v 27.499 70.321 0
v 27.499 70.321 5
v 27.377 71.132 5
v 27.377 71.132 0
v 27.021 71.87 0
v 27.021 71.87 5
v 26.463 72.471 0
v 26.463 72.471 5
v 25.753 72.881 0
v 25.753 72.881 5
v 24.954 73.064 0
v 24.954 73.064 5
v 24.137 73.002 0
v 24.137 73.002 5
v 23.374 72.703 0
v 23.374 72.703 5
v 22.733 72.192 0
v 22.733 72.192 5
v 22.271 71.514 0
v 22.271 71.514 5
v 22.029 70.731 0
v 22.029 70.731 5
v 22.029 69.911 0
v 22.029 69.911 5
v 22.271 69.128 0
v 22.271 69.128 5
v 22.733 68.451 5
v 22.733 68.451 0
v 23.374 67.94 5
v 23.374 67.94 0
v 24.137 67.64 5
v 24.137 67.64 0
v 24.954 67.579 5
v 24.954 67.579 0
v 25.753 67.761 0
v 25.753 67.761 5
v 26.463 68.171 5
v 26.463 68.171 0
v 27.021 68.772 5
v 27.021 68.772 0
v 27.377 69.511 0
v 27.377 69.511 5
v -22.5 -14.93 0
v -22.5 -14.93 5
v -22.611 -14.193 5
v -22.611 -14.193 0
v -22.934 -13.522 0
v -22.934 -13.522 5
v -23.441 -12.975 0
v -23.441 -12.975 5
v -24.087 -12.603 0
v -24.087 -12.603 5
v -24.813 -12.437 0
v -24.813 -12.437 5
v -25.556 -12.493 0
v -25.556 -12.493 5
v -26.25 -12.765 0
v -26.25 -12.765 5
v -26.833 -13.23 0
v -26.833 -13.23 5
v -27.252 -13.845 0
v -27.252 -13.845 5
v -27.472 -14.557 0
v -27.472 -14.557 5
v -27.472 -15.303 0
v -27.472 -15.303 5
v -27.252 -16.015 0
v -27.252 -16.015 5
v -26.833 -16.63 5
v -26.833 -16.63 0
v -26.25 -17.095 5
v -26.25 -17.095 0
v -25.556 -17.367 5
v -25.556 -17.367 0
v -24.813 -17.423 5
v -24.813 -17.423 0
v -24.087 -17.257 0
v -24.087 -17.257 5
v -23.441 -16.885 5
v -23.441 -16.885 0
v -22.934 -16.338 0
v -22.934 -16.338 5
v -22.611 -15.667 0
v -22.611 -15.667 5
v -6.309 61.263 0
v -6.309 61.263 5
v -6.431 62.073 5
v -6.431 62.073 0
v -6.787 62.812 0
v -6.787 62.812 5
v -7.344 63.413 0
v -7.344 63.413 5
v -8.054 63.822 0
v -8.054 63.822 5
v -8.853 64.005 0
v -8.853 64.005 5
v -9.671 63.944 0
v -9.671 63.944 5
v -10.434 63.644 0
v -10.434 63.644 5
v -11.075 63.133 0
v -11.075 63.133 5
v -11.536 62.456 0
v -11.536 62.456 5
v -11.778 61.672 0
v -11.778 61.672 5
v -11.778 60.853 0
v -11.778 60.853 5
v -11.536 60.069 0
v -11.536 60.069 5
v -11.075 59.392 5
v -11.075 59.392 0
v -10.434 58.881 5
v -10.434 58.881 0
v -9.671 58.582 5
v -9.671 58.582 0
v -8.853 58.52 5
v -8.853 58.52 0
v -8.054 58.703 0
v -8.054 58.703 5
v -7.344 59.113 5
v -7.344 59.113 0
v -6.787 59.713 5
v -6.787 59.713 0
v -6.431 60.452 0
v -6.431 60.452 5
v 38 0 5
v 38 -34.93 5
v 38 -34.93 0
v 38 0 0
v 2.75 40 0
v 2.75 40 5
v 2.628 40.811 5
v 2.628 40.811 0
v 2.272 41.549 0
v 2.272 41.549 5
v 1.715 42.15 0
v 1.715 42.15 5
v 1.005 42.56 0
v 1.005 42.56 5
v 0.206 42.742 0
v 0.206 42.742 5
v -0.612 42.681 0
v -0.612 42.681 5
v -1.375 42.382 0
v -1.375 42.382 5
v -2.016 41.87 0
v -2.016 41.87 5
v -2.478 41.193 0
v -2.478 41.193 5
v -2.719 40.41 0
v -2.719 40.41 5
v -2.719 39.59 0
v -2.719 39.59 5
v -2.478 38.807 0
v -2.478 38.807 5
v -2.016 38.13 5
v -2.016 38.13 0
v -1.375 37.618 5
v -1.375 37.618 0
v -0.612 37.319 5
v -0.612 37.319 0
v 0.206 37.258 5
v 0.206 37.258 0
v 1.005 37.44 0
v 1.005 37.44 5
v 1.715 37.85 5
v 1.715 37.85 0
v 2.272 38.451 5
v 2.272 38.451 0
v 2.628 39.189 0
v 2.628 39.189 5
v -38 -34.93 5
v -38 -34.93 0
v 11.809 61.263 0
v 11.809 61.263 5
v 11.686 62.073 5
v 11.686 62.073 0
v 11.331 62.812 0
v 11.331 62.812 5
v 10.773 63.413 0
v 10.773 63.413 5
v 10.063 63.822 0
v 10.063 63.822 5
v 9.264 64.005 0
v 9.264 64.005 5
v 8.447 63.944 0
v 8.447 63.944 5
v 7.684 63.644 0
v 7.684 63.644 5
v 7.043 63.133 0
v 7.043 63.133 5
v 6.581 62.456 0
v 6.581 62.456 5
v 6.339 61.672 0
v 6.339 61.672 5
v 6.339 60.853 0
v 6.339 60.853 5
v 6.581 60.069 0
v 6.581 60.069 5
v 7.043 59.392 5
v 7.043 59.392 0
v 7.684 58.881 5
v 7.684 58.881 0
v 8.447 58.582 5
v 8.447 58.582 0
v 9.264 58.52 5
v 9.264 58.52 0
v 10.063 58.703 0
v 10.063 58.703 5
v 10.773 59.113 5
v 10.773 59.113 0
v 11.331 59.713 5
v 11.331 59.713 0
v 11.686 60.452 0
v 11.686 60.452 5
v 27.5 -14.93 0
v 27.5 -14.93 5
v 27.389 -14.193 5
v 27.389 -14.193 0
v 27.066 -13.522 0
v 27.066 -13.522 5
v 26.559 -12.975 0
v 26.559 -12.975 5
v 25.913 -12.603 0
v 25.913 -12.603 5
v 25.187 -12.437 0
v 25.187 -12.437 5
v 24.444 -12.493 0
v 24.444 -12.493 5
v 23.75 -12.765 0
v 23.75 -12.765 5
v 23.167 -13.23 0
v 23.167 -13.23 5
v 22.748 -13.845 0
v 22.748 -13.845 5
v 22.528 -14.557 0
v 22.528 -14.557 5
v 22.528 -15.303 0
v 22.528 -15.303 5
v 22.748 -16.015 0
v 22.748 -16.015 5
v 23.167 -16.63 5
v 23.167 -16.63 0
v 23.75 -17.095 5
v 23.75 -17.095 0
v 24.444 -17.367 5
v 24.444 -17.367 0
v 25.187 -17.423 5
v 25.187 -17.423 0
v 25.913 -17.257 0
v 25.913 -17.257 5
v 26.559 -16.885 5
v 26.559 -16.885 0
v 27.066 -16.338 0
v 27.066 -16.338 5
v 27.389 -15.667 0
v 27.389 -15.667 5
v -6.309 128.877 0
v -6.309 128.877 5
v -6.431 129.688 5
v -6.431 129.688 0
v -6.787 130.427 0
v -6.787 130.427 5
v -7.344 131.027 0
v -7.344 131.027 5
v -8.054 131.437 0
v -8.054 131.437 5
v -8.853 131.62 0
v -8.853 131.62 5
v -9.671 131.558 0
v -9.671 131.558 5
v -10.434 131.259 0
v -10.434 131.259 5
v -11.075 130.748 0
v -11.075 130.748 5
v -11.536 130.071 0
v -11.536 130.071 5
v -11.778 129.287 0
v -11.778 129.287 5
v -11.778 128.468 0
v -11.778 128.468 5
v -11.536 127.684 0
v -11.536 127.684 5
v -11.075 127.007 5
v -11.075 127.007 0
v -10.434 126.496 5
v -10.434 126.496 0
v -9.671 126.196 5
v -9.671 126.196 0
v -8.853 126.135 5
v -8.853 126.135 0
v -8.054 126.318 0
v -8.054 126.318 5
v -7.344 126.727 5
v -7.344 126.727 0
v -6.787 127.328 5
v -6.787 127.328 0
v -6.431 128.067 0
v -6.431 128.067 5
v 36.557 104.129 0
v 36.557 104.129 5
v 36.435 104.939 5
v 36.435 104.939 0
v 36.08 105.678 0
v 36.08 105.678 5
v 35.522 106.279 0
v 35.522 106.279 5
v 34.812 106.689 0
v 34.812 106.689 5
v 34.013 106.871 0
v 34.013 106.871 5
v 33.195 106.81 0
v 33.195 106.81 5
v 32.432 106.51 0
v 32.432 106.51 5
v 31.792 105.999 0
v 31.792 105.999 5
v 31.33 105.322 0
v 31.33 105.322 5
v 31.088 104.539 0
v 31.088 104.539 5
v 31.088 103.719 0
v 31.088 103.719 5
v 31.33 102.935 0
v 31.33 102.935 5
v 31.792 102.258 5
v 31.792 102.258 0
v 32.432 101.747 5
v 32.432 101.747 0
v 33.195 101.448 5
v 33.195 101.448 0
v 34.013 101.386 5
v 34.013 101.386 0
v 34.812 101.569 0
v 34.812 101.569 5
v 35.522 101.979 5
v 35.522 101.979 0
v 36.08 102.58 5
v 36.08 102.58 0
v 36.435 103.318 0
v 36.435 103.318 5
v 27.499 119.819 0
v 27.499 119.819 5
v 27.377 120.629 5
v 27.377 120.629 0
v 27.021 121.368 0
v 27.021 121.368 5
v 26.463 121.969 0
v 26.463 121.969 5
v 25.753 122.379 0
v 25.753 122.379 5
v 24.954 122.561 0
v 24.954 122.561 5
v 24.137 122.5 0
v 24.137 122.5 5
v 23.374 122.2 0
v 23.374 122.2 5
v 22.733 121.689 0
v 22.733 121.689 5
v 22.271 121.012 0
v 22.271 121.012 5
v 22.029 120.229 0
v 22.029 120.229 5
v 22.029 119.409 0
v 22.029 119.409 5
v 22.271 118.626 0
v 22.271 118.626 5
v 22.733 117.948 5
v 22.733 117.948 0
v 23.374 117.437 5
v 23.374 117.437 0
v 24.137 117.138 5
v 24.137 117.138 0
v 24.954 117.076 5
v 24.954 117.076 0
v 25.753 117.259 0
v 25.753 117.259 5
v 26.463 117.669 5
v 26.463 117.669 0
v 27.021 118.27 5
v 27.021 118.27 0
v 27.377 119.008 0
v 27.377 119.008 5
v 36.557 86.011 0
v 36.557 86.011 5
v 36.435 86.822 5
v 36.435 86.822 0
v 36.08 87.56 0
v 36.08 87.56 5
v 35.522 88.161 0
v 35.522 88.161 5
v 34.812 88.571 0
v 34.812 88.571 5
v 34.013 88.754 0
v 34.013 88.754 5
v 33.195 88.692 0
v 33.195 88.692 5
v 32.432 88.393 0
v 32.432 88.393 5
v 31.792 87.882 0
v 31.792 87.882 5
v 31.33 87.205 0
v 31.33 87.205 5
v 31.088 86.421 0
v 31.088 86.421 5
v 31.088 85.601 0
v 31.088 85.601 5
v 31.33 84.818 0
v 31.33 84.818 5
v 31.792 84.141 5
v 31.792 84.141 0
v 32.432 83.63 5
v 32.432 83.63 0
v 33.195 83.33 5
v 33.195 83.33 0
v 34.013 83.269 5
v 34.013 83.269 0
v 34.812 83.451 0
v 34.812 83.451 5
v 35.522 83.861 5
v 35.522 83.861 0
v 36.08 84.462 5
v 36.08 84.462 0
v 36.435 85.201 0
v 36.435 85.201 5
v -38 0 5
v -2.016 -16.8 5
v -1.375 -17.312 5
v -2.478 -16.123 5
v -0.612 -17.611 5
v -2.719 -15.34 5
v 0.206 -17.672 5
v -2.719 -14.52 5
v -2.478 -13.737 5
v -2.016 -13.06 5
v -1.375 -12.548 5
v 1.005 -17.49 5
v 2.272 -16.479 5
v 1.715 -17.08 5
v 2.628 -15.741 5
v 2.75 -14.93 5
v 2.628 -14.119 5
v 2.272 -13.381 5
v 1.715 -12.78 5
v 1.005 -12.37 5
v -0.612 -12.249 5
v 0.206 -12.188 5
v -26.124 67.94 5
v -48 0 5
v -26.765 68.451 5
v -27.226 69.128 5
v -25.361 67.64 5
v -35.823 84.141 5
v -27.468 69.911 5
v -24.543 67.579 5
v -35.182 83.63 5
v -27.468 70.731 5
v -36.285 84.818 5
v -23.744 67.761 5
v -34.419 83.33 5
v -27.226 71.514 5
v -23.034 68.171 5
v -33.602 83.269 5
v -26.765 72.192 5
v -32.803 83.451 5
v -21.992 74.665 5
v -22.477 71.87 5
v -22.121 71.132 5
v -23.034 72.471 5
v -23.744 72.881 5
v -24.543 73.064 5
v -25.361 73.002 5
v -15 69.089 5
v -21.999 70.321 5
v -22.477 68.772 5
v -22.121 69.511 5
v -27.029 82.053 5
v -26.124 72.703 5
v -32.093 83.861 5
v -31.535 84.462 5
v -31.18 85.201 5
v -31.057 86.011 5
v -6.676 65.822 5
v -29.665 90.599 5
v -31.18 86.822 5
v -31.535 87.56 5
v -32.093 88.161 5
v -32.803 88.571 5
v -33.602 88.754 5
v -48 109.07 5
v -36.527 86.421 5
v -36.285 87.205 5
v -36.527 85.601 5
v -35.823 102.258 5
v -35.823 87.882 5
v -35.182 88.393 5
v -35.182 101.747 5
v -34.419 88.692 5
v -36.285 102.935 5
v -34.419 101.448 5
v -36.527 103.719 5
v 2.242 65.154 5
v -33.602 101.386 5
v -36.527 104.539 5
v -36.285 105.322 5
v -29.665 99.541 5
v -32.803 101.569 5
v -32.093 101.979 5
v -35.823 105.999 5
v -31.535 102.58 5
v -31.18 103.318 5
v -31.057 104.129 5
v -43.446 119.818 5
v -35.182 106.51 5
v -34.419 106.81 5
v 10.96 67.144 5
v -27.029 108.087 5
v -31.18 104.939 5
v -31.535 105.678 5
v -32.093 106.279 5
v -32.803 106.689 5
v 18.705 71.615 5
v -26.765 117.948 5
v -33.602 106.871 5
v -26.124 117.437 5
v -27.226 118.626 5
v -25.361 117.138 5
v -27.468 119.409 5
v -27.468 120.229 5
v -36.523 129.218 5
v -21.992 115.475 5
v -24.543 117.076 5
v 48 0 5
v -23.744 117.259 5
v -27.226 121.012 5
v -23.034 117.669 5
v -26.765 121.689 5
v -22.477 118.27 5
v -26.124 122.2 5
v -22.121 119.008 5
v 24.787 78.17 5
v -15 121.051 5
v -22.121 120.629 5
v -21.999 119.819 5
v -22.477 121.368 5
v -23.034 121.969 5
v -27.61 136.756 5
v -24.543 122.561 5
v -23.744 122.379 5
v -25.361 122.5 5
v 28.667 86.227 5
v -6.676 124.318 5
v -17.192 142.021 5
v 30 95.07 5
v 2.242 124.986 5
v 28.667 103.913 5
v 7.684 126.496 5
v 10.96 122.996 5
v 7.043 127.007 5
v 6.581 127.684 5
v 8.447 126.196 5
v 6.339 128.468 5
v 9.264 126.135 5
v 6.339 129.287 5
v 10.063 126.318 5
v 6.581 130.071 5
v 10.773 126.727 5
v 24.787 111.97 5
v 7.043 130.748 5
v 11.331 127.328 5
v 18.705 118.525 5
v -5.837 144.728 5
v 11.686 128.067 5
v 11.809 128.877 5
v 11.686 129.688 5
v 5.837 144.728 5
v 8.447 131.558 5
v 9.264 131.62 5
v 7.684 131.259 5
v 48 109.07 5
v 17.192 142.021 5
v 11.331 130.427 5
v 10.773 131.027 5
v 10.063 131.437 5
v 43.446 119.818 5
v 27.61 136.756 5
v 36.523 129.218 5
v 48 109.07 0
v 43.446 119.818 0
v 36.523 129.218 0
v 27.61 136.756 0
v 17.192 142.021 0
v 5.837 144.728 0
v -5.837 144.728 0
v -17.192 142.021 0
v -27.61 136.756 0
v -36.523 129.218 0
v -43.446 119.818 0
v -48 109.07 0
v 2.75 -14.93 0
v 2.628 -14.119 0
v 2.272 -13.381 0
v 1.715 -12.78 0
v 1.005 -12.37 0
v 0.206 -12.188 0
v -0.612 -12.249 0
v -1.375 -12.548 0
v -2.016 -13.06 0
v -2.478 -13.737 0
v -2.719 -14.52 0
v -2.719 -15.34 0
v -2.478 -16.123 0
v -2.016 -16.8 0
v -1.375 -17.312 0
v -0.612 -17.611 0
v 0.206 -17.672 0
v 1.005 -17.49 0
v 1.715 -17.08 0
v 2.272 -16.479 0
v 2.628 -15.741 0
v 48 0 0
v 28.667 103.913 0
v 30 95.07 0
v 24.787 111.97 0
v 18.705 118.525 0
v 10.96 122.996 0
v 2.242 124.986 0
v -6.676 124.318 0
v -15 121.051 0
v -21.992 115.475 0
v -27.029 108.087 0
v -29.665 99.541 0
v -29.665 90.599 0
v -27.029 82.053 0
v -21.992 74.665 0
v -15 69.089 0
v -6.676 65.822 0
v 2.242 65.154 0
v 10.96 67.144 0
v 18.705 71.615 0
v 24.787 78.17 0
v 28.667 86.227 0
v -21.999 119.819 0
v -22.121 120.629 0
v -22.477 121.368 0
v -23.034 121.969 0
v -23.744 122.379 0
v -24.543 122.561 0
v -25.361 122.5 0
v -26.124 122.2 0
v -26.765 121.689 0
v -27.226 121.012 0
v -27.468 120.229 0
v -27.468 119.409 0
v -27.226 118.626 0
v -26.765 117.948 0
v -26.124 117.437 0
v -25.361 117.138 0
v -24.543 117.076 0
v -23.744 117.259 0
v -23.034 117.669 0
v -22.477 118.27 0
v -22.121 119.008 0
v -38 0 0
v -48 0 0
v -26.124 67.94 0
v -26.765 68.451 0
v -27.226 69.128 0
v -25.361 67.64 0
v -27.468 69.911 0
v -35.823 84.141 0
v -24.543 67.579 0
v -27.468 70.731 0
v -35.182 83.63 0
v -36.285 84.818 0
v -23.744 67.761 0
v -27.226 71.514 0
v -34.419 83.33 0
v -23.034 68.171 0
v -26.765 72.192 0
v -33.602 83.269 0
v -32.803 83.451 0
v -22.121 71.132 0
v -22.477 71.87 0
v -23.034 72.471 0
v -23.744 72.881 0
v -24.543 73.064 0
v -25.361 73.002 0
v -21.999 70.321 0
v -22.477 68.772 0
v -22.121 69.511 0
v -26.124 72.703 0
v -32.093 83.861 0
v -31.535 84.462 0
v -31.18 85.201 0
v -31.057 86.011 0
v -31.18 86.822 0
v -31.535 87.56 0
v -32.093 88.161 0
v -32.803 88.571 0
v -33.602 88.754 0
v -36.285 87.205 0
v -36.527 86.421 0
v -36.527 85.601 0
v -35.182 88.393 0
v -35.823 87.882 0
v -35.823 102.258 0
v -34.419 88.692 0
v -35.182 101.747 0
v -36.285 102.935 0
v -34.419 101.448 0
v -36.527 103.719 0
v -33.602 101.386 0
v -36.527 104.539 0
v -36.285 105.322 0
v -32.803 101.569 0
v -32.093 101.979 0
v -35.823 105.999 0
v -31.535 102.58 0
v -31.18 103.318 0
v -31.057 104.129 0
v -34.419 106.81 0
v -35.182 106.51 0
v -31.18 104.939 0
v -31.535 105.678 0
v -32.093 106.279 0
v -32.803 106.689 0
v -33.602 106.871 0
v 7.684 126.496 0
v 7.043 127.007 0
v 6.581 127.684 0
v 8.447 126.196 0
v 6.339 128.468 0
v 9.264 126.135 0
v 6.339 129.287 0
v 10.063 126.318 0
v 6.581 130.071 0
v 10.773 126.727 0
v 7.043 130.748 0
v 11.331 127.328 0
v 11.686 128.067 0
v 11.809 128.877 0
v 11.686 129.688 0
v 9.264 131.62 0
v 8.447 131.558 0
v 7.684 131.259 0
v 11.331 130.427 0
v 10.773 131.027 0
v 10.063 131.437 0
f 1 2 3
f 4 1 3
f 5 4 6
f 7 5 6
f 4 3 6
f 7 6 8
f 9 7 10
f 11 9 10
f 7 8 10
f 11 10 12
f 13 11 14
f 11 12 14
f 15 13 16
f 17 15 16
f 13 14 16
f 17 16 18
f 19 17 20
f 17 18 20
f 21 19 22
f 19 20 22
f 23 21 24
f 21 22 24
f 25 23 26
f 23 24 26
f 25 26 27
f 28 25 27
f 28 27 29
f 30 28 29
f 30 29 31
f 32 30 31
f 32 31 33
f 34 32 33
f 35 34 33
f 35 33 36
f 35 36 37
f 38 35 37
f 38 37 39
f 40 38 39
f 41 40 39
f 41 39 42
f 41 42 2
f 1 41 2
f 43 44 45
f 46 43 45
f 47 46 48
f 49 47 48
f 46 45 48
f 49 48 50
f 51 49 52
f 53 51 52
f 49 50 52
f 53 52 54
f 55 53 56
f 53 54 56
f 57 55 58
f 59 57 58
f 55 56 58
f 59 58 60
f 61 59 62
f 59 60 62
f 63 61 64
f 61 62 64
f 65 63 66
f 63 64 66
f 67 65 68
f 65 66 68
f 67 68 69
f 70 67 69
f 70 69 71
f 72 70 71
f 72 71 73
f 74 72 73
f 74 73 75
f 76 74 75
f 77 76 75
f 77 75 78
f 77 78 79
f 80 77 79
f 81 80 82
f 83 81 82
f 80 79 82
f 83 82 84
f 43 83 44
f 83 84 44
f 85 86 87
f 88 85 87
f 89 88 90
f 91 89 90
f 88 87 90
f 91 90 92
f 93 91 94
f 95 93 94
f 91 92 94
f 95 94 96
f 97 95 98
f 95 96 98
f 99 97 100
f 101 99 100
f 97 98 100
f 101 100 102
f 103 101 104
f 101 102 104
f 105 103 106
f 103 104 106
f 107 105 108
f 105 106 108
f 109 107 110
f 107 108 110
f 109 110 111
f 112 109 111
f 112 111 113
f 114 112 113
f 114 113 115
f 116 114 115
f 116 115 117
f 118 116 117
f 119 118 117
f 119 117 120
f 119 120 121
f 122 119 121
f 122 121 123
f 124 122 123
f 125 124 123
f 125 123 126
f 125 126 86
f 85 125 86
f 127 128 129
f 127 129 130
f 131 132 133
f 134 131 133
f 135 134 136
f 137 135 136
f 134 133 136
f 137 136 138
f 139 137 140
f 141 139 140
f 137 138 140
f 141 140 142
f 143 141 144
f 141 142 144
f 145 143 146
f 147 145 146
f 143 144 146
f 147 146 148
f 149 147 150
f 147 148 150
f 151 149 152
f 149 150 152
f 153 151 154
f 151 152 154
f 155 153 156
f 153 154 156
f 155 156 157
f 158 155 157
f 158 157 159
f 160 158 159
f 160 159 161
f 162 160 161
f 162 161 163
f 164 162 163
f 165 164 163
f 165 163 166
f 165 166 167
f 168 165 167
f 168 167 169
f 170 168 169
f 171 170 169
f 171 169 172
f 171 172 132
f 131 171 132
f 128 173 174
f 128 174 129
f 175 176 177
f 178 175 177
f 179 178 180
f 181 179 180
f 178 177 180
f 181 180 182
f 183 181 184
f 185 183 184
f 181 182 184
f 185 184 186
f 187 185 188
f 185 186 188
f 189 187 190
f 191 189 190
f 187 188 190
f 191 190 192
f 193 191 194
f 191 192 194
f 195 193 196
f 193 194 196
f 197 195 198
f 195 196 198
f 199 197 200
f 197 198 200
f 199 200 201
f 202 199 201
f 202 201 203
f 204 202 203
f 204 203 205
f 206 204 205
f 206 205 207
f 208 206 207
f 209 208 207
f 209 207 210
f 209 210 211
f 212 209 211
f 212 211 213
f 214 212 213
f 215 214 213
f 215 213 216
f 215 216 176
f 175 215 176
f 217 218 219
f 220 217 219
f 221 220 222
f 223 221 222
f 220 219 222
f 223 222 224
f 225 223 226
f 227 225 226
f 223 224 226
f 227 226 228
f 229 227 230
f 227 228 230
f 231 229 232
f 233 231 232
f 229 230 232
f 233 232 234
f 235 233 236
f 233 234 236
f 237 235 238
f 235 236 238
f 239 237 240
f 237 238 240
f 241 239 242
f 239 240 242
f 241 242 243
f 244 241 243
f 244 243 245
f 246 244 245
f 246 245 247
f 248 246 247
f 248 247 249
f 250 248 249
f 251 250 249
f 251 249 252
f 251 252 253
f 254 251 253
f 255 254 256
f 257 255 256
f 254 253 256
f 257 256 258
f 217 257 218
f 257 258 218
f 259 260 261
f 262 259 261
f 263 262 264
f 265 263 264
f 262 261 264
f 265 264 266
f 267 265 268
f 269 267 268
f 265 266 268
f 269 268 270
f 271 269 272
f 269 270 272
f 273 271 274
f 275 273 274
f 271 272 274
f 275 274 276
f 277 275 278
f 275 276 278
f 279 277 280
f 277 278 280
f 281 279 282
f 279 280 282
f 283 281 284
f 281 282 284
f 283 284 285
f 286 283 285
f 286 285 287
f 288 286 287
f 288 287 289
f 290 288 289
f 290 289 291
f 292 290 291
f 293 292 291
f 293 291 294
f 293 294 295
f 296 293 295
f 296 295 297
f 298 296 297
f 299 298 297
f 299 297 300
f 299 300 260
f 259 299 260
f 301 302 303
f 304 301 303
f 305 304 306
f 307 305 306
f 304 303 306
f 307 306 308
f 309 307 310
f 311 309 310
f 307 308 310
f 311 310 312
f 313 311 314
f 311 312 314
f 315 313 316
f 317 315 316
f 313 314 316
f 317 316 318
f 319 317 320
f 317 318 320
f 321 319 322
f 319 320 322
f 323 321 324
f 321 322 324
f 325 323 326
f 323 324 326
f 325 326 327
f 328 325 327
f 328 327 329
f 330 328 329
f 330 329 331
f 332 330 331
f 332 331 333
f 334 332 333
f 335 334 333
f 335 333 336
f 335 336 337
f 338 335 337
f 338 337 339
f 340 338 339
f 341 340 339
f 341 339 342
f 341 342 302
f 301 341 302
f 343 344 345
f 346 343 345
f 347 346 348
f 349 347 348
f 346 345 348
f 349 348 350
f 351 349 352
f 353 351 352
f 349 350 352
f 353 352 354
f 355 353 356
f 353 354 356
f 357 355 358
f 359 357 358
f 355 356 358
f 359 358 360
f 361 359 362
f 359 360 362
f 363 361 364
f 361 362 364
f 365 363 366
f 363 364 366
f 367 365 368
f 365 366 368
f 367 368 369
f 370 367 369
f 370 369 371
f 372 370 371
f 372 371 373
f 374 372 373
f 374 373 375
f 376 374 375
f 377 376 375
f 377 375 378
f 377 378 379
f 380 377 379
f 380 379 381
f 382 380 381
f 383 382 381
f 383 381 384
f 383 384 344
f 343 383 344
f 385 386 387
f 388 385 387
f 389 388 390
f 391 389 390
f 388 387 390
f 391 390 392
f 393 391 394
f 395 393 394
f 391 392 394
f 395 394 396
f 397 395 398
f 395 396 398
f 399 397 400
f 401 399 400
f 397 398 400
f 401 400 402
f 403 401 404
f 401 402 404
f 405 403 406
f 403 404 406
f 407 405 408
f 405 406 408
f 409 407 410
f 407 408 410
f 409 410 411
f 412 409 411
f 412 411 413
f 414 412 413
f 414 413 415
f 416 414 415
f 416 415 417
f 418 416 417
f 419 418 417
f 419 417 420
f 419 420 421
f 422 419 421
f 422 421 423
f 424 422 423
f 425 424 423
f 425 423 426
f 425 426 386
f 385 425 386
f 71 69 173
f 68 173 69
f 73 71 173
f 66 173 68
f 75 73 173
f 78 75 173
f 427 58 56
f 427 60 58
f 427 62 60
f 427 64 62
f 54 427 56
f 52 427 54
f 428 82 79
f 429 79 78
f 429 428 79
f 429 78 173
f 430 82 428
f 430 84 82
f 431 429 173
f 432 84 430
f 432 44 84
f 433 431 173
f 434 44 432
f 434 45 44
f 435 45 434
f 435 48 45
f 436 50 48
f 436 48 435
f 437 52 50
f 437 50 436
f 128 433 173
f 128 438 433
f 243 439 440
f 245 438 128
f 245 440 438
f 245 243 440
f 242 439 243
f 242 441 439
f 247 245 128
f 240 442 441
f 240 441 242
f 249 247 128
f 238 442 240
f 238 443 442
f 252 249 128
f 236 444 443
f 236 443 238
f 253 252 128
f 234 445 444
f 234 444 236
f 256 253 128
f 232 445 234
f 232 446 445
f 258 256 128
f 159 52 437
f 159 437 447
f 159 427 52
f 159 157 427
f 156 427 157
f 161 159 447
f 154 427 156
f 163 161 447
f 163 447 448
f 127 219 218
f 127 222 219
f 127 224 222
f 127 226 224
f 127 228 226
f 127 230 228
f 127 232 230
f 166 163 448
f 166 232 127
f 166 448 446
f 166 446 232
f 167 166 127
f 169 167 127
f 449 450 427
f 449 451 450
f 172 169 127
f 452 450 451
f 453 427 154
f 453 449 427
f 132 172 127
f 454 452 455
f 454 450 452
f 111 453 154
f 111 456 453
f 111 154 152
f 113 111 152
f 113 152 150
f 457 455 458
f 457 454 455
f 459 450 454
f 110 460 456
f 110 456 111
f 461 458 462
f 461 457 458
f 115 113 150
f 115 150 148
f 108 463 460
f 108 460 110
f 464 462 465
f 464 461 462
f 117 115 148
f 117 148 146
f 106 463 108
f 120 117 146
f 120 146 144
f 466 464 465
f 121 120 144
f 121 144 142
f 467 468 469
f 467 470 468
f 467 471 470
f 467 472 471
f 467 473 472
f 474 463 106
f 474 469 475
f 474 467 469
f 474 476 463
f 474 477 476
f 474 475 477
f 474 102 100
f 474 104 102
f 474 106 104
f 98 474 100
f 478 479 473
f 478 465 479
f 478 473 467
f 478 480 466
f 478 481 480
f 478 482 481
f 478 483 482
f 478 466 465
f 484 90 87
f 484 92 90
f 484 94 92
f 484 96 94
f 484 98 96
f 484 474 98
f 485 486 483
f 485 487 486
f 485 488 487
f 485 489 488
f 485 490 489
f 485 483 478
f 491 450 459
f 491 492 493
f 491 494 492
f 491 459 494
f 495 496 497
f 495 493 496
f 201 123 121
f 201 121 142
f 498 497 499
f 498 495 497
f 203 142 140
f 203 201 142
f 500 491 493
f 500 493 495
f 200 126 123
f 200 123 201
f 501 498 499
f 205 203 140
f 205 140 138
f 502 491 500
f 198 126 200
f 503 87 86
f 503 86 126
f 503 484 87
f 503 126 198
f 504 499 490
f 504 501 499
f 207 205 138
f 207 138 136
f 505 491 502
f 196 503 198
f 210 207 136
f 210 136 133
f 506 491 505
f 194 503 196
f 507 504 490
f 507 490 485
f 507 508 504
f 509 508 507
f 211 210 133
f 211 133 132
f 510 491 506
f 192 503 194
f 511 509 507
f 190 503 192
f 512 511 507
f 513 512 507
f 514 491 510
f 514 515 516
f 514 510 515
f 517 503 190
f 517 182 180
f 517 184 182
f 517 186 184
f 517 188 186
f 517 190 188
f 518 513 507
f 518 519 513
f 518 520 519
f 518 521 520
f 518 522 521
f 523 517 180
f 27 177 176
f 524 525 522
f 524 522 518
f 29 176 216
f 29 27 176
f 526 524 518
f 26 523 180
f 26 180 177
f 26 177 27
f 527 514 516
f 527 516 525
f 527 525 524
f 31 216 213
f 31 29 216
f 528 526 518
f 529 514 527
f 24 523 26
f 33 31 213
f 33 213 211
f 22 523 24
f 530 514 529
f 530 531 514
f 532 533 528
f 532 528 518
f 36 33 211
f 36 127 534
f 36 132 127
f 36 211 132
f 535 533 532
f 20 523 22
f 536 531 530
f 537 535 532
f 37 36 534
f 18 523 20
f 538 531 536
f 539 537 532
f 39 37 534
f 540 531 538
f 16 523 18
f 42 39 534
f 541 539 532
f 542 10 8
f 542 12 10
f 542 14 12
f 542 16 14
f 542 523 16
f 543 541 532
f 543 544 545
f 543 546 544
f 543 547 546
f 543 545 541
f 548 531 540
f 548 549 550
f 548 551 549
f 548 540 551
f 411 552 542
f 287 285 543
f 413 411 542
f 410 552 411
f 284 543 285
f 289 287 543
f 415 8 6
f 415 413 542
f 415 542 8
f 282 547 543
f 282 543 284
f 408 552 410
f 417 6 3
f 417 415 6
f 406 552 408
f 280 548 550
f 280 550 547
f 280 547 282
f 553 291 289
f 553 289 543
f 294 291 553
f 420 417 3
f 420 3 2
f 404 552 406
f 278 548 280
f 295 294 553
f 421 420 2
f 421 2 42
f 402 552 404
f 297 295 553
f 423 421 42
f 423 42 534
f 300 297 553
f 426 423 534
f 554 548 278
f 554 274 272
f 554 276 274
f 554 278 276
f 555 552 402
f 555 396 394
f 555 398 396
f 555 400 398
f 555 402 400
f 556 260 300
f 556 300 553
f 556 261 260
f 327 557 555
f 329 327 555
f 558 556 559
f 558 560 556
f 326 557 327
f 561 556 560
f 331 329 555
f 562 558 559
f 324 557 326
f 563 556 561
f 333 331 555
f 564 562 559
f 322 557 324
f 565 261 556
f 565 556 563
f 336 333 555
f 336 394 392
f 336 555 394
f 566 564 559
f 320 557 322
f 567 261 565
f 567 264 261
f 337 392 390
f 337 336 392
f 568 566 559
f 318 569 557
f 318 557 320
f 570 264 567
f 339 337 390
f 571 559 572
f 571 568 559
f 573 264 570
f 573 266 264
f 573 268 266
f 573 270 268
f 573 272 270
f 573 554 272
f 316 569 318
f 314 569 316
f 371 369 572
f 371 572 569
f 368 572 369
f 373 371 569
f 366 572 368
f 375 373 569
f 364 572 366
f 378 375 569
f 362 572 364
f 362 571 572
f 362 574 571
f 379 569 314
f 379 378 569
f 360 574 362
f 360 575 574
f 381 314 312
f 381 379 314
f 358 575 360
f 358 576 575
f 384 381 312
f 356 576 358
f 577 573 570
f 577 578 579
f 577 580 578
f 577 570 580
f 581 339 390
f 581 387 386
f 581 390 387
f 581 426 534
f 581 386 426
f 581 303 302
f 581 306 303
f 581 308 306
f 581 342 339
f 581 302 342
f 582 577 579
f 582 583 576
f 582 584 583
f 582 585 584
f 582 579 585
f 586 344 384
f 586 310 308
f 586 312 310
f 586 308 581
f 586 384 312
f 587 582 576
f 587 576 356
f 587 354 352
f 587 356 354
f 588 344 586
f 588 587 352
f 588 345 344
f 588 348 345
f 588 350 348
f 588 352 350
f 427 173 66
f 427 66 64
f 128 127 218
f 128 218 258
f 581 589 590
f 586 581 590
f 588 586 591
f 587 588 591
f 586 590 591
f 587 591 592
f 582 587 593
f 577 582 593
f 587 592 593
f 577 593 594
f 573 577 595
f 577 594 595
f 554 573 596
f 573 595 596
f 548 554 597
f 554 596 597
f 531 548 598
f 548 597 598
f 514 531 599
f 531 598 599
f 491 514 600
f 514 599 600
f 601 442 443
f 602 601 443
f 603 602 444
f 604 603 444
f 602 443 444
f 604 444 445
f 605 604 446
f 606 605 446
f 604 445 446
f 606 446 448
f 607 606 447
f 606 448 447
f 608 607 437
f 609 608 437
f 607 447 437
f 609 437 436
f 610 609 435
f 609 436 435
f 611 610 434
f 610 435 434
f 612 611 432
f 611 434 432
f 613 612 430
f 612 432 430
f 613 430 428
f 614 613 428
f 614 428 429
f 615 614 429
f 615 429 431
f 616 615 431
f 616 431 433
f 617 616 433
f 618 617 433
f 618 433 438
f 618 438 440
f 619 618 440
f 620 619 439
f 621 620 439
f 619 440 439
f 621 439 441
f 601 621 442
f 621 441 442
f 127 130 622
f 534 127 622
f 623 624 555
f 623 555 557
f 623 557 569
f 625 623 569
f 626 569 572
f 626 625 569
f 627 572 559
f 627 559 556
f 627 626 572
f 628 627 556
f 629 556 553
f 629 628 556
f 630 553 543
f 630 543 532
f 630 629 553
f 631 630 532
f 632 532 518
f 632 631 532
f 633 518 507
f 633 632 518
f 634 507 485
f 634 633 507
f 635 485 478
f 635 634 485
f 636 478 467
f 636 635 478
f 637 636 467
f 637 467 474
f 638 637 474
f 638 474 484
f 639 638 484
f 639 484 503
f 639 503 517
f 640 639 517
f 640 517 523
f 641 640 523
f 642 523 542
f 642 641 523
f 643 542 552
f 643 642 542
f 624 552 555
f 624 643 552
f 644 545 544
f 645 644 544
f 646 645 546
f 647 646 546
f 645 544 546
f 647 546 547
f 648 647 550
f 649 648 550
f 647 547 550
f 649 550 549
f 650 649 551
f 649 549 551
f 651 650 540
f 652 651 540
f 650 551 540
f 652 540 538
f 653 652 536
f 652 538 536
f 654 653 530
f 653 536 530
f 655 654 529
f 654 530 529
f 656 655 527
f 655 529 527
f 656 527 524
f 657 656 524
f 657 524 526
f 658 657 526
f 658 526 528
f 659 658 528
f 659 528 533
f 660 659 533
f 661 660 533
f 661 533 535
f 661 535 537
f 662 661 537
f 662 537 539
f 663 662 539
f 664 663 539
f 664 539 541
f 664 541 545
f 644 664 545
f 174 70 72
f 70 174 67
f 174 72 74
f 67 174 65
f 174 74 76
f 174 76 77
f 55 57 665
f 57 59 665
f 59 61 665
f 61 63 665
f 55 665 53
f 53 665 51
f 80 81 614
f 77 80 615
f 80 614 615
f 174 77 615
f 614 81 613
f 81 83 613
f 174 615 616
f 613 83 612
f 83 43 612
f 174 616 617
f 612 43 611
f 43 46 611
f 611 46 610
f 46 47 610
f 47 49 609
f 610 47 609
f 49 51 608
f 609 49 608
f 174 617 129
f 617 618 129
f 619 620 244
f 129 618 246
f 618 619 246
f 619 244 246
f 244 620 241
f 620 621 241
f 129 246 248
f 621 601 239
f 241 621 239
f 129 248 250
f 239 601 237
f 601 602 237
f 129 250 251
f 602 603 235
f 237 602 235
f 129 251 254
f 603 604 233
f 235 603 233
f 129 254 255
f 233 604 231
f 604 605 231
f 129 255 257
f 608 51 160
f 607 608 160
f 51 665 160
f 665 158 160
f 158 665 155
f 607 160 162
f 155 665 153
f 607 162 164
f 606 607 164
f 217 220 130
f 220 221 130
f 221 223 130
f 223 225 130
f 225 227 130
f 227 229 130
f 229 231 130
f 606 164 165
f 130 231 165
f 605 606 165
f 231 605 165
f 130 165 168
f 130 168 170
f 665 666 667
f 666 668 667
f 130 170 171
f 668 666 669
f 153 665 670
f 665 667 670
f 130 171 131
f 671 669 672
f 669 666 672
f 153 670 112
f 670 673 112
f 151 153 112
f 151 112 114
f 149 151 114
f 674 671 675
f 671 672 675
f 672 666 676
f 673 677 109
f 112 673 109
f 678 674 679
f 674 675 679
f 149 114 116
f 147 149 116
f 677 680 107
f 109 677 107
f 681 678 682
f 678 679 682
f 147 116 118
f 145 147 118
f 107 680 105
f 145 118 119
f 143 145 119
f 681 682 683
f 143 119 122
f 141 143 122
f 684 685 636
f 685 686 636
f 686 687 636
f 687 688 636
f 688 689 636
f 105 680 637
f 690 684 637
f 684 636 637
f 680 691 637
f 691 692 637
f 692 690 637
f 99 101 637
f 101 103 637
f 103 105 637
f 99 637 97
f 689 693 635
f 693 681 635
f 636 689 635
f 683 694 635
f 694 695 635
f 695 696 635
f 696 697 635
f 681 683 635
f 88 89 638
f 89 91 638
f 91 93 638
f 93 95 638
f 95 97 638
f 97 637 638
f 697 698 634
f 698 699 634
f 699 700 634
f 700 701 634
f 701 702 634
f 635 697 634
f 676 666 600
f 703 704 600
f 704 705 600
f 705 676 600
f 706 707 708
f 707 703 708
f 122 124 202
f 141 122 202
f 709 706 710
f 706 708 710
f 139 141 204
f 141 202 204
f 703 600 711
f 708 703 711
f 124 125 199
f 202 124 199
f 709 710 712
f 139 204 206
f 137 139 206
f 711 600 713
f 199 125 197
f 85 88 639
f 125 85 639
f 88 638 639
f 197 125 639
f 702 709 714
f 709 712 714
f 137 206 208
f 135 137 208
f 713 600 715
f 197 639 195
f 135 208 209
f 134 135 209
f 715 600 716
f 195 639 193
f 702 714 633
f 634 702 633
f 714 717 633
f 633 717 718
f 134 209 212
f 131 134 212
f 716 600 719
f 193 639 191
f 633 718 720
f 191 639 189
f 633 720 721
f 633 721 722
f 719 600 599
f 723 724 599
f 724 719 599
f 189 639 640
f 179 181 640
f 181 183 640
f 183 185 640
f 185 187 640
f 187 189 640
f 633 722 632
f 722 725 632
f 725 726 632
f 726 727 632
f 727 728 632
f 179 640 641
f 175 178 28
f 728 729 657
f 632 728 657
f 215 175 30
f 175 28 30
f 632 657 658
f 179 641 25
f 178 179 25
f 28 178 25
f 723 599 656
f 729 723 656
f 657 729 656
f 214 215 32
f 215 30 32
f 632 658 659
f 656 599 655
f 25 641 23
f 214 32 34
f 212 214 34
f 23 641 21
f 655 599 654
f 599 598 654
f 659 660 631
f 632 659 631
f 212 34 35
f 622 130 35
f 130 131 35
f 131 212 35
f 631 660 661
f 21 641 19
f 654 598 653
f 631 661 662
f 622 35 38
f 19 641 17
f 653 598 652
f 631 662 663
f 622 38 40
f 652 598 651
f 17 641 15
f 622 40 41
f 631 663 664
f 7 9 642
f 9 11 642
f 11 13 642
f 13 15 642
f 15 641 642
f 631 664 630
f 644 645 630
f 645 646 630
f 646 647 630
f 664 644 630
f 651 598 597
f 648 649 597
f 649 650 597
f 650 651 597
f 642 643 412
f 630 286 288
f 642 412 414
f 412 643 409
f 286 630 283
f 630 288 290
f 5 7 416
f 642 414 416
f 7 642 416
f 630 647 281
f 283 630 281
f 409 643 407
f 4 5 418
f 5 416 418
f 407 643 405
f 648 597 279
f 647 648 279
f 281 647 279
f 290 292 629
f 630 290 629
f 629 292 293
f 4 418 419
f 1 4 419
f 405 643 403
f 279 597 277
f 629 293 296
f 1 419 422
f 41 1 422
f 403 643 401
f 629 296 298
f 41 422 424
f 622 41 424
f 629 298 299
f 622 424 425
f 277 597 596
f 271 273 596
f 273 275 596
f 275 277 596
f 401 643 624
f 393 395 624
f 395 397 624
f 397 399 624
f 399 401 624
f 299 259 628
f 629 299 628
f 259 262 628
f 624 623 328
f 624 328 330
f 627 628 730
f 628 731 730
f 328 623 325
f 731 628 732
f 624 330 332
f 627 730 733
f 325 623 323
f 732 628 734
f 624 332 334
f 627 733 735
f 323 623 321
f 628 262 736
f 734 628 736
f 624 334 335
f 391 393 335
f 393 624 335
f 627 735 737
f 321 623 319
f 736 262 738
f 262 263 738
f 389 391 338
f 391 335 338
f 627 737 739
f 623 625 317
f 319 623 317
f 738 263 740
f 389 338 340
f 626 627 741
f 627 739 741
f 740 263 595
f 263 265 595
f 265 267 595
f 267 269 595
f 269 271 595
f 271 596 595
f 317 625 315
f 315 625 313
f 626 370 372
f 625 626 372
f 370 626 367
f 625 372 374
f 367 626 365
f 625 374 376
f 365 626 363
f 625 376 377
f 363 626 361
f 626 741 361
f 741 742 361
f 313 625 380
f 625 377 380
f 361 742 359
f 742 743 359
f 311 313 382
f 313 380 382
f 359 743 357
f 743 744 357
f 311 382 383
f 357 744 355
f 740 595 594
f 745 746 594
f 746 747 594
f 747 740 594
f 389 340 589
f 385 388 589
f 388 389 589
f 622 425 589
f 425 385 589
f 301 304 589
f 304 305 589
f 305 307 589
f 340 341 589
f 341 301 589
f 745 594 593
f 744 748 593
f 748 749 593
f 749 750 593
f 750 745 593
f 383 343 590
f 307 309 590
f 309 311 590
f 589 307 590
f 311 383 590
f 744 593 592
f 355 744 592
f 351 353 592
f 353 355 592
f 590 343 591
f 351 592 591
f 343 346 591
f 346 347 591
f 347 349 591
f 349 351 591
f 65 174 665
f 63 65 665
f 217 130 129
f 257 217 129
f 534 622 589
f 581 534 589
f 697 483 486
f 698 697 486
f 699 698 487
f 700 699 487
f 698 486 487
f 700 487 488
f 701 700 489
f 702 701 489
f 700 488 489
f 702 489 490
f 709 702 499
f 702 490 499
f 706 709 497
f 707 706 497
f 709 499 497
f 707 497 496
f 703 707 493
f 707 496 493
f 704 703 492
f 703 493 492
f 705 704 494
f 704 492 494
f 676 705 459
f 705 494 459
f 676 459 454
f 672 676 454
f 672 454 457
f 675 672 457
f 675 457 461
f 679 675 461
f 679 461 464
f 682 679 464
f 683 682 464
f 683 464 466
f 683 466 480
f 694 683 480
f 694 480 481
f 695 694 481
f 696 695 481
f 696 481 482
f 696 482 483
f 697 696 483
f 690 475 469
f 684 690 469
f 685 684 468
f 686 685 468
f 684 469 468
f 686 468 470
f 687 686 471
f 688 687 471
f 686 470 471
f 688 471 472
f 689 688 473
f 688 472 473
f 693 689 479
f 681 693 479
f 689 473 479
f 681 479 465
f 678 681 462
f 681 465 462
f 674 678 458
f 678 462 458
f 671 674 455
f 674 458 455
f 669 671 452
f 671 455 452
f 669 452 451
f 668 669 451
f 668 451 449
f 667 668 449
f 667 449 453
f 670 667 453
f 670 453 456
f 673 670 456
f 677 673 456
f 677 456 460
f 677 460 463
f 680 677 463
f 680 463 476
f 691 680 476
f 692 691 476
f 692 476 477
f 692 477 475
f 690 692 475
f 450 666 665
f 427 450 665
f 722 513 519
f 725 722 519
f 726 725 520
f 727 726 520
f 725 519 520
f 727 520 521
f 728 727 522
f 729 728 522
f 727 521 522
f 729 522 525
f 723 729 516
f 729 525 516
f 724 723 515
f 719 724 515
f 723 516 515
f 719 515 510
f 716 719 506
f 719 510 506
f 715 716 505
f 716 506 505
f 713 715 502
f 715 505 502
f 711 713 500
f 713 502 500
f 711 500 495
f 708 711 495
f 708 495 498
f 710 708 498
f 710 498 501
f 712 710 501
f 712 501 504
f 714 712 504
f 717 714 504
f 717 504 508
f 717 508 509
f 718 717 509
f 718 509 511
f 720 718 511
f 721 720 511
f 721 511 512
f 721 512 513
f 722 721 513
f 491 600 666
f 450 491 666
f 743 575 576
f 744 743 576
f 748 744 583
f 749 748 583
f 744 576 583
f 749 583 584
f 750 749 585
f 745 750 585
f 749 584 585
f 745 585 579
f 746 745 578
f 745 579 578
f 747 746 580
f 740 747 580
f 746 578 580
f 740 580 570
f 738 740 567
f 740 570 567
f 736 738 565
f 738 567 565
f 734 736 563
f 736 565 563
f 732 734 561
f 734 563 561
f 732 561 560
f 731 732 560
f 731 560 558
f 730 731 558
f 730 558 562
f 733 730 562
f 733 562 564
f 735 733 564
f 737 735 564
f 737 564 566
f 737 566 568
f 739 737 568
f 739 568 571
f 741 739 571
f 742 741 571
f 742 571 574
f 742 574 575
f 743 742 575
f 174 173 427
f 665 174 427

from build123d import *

# Parameters (mm, degrees)
SKETCH_1_R          = 30
EXTRUDE_1_DEPTH     = 5
SKETCH_3_R          = 2.75
CUT_EXTRUDE_2_DEPTH = 20
SKETCH_4_R          = 2.75
CUT_EXTRUDE_3_DEPTH = 10
SKETCH_10_W         = 76
SKETCH_10_H         = 34.93
SKETCH_10_R         = 2.5
SKETCH_10_R_2       = 2.75
EXTRUDE_2_DEPTH     = 5


with BuildPart() as part:
    # 草图1 → 凸台-拉伸1 (new body)
    with BuildSketch(Plane.XY):
        with BuildLine():
            Line((-48, 109.07), (-48, 0))
            Line((-48, 0), (48, 0))
            Line((48, 0), (48, 109.07))
            ThreePointArc((48, 109.07), (0, 145.07), (-48, 109.07))
        make_face()
        with Locations((0, 95.07)):
            Circle(SKETCH_1_R, mode=Mode.SUBTRACT)
    extrude(amount=EXTRUDE_1_DEPTH)

    # 草图3 → 切除-拉伸2 (cut)
    with BuildSketch(Plane.XY.offset(5)):
        with Locations((0, 40)):
            Circle(SKETCH_3_R)
    extrude(amount=-CUT_EXTRUDE_2_DEPTH, mode=Mode.SUBTRACT)

    # 草图4 → 切除-拉伸3 (cut)
    with BuildSketch(Plane.XY.offset(5)):
        with Locations((9.058666579, 128.87740392)):
            Circle(SKETCH_4_R)
        with Locations((24.748737342, 119.818737342)):
            Circle(SKETCH_4_R)
        with Locations((33.80740392, 104.128666579)):
            Circle(SKETCH_4_R)
        with Locations((33.80740392, 86.011333421)):
            Circle(SKETCH_4_R)
        with Locations((24.748737342, 70.321262658)):
            Circle(SKETCH_4_R)
        with Locations((9.058666579, 61.26259608)):
            Circle(SKETCH_4_R)
        with Locations((-9.058666579, 61.26259608)):
            Circle(SKETCH_4_R)
        with Locations((-24.748737342, 70.321262658)):
            Circle(SKETCH_4_R)
        with Locations((-33.80740392, 86.011333421)):
            Circle(SKETCH_4_R)
        with Locations((-33.80740392, 104.128666579)):
            Circle(SKETCH_4_R)
        with Locations((-24.748737342, 119.818737342)):
            Circle(SKETCH_4_R)
        with Locations((-9.058666579, 128.87740392)):
            Circle(SKETCH_4_R)
    extrude(amount=-CUT_EXTRUDE_3_DEPTH, mode=Mode.SUBTRACT)

    # 草图10 → 凸台-拉伸2 (add)
    with BuildSketch(Plane.XY.offset(5)):
        with Locations((0, -17.465)):
            Rectangle(SKETCH_10_W, SKETCH_10_H)
        with Locations((25, -14.93)):
            Circle(SKETCH_10_R, mode=Mode.SUBTRACT)
        with Locations((-25, -14.93)):
            Circle(SKETCH_10_R, mode=Mode.SUBTRACT)
        with Locations((0, -14.93)):
            Circle(SKETCH_10_R_2, mode=Mode.SUBTRACT)
    extrude(amount=-EXTRUDE_2_DEPTH)


solid = part.part
